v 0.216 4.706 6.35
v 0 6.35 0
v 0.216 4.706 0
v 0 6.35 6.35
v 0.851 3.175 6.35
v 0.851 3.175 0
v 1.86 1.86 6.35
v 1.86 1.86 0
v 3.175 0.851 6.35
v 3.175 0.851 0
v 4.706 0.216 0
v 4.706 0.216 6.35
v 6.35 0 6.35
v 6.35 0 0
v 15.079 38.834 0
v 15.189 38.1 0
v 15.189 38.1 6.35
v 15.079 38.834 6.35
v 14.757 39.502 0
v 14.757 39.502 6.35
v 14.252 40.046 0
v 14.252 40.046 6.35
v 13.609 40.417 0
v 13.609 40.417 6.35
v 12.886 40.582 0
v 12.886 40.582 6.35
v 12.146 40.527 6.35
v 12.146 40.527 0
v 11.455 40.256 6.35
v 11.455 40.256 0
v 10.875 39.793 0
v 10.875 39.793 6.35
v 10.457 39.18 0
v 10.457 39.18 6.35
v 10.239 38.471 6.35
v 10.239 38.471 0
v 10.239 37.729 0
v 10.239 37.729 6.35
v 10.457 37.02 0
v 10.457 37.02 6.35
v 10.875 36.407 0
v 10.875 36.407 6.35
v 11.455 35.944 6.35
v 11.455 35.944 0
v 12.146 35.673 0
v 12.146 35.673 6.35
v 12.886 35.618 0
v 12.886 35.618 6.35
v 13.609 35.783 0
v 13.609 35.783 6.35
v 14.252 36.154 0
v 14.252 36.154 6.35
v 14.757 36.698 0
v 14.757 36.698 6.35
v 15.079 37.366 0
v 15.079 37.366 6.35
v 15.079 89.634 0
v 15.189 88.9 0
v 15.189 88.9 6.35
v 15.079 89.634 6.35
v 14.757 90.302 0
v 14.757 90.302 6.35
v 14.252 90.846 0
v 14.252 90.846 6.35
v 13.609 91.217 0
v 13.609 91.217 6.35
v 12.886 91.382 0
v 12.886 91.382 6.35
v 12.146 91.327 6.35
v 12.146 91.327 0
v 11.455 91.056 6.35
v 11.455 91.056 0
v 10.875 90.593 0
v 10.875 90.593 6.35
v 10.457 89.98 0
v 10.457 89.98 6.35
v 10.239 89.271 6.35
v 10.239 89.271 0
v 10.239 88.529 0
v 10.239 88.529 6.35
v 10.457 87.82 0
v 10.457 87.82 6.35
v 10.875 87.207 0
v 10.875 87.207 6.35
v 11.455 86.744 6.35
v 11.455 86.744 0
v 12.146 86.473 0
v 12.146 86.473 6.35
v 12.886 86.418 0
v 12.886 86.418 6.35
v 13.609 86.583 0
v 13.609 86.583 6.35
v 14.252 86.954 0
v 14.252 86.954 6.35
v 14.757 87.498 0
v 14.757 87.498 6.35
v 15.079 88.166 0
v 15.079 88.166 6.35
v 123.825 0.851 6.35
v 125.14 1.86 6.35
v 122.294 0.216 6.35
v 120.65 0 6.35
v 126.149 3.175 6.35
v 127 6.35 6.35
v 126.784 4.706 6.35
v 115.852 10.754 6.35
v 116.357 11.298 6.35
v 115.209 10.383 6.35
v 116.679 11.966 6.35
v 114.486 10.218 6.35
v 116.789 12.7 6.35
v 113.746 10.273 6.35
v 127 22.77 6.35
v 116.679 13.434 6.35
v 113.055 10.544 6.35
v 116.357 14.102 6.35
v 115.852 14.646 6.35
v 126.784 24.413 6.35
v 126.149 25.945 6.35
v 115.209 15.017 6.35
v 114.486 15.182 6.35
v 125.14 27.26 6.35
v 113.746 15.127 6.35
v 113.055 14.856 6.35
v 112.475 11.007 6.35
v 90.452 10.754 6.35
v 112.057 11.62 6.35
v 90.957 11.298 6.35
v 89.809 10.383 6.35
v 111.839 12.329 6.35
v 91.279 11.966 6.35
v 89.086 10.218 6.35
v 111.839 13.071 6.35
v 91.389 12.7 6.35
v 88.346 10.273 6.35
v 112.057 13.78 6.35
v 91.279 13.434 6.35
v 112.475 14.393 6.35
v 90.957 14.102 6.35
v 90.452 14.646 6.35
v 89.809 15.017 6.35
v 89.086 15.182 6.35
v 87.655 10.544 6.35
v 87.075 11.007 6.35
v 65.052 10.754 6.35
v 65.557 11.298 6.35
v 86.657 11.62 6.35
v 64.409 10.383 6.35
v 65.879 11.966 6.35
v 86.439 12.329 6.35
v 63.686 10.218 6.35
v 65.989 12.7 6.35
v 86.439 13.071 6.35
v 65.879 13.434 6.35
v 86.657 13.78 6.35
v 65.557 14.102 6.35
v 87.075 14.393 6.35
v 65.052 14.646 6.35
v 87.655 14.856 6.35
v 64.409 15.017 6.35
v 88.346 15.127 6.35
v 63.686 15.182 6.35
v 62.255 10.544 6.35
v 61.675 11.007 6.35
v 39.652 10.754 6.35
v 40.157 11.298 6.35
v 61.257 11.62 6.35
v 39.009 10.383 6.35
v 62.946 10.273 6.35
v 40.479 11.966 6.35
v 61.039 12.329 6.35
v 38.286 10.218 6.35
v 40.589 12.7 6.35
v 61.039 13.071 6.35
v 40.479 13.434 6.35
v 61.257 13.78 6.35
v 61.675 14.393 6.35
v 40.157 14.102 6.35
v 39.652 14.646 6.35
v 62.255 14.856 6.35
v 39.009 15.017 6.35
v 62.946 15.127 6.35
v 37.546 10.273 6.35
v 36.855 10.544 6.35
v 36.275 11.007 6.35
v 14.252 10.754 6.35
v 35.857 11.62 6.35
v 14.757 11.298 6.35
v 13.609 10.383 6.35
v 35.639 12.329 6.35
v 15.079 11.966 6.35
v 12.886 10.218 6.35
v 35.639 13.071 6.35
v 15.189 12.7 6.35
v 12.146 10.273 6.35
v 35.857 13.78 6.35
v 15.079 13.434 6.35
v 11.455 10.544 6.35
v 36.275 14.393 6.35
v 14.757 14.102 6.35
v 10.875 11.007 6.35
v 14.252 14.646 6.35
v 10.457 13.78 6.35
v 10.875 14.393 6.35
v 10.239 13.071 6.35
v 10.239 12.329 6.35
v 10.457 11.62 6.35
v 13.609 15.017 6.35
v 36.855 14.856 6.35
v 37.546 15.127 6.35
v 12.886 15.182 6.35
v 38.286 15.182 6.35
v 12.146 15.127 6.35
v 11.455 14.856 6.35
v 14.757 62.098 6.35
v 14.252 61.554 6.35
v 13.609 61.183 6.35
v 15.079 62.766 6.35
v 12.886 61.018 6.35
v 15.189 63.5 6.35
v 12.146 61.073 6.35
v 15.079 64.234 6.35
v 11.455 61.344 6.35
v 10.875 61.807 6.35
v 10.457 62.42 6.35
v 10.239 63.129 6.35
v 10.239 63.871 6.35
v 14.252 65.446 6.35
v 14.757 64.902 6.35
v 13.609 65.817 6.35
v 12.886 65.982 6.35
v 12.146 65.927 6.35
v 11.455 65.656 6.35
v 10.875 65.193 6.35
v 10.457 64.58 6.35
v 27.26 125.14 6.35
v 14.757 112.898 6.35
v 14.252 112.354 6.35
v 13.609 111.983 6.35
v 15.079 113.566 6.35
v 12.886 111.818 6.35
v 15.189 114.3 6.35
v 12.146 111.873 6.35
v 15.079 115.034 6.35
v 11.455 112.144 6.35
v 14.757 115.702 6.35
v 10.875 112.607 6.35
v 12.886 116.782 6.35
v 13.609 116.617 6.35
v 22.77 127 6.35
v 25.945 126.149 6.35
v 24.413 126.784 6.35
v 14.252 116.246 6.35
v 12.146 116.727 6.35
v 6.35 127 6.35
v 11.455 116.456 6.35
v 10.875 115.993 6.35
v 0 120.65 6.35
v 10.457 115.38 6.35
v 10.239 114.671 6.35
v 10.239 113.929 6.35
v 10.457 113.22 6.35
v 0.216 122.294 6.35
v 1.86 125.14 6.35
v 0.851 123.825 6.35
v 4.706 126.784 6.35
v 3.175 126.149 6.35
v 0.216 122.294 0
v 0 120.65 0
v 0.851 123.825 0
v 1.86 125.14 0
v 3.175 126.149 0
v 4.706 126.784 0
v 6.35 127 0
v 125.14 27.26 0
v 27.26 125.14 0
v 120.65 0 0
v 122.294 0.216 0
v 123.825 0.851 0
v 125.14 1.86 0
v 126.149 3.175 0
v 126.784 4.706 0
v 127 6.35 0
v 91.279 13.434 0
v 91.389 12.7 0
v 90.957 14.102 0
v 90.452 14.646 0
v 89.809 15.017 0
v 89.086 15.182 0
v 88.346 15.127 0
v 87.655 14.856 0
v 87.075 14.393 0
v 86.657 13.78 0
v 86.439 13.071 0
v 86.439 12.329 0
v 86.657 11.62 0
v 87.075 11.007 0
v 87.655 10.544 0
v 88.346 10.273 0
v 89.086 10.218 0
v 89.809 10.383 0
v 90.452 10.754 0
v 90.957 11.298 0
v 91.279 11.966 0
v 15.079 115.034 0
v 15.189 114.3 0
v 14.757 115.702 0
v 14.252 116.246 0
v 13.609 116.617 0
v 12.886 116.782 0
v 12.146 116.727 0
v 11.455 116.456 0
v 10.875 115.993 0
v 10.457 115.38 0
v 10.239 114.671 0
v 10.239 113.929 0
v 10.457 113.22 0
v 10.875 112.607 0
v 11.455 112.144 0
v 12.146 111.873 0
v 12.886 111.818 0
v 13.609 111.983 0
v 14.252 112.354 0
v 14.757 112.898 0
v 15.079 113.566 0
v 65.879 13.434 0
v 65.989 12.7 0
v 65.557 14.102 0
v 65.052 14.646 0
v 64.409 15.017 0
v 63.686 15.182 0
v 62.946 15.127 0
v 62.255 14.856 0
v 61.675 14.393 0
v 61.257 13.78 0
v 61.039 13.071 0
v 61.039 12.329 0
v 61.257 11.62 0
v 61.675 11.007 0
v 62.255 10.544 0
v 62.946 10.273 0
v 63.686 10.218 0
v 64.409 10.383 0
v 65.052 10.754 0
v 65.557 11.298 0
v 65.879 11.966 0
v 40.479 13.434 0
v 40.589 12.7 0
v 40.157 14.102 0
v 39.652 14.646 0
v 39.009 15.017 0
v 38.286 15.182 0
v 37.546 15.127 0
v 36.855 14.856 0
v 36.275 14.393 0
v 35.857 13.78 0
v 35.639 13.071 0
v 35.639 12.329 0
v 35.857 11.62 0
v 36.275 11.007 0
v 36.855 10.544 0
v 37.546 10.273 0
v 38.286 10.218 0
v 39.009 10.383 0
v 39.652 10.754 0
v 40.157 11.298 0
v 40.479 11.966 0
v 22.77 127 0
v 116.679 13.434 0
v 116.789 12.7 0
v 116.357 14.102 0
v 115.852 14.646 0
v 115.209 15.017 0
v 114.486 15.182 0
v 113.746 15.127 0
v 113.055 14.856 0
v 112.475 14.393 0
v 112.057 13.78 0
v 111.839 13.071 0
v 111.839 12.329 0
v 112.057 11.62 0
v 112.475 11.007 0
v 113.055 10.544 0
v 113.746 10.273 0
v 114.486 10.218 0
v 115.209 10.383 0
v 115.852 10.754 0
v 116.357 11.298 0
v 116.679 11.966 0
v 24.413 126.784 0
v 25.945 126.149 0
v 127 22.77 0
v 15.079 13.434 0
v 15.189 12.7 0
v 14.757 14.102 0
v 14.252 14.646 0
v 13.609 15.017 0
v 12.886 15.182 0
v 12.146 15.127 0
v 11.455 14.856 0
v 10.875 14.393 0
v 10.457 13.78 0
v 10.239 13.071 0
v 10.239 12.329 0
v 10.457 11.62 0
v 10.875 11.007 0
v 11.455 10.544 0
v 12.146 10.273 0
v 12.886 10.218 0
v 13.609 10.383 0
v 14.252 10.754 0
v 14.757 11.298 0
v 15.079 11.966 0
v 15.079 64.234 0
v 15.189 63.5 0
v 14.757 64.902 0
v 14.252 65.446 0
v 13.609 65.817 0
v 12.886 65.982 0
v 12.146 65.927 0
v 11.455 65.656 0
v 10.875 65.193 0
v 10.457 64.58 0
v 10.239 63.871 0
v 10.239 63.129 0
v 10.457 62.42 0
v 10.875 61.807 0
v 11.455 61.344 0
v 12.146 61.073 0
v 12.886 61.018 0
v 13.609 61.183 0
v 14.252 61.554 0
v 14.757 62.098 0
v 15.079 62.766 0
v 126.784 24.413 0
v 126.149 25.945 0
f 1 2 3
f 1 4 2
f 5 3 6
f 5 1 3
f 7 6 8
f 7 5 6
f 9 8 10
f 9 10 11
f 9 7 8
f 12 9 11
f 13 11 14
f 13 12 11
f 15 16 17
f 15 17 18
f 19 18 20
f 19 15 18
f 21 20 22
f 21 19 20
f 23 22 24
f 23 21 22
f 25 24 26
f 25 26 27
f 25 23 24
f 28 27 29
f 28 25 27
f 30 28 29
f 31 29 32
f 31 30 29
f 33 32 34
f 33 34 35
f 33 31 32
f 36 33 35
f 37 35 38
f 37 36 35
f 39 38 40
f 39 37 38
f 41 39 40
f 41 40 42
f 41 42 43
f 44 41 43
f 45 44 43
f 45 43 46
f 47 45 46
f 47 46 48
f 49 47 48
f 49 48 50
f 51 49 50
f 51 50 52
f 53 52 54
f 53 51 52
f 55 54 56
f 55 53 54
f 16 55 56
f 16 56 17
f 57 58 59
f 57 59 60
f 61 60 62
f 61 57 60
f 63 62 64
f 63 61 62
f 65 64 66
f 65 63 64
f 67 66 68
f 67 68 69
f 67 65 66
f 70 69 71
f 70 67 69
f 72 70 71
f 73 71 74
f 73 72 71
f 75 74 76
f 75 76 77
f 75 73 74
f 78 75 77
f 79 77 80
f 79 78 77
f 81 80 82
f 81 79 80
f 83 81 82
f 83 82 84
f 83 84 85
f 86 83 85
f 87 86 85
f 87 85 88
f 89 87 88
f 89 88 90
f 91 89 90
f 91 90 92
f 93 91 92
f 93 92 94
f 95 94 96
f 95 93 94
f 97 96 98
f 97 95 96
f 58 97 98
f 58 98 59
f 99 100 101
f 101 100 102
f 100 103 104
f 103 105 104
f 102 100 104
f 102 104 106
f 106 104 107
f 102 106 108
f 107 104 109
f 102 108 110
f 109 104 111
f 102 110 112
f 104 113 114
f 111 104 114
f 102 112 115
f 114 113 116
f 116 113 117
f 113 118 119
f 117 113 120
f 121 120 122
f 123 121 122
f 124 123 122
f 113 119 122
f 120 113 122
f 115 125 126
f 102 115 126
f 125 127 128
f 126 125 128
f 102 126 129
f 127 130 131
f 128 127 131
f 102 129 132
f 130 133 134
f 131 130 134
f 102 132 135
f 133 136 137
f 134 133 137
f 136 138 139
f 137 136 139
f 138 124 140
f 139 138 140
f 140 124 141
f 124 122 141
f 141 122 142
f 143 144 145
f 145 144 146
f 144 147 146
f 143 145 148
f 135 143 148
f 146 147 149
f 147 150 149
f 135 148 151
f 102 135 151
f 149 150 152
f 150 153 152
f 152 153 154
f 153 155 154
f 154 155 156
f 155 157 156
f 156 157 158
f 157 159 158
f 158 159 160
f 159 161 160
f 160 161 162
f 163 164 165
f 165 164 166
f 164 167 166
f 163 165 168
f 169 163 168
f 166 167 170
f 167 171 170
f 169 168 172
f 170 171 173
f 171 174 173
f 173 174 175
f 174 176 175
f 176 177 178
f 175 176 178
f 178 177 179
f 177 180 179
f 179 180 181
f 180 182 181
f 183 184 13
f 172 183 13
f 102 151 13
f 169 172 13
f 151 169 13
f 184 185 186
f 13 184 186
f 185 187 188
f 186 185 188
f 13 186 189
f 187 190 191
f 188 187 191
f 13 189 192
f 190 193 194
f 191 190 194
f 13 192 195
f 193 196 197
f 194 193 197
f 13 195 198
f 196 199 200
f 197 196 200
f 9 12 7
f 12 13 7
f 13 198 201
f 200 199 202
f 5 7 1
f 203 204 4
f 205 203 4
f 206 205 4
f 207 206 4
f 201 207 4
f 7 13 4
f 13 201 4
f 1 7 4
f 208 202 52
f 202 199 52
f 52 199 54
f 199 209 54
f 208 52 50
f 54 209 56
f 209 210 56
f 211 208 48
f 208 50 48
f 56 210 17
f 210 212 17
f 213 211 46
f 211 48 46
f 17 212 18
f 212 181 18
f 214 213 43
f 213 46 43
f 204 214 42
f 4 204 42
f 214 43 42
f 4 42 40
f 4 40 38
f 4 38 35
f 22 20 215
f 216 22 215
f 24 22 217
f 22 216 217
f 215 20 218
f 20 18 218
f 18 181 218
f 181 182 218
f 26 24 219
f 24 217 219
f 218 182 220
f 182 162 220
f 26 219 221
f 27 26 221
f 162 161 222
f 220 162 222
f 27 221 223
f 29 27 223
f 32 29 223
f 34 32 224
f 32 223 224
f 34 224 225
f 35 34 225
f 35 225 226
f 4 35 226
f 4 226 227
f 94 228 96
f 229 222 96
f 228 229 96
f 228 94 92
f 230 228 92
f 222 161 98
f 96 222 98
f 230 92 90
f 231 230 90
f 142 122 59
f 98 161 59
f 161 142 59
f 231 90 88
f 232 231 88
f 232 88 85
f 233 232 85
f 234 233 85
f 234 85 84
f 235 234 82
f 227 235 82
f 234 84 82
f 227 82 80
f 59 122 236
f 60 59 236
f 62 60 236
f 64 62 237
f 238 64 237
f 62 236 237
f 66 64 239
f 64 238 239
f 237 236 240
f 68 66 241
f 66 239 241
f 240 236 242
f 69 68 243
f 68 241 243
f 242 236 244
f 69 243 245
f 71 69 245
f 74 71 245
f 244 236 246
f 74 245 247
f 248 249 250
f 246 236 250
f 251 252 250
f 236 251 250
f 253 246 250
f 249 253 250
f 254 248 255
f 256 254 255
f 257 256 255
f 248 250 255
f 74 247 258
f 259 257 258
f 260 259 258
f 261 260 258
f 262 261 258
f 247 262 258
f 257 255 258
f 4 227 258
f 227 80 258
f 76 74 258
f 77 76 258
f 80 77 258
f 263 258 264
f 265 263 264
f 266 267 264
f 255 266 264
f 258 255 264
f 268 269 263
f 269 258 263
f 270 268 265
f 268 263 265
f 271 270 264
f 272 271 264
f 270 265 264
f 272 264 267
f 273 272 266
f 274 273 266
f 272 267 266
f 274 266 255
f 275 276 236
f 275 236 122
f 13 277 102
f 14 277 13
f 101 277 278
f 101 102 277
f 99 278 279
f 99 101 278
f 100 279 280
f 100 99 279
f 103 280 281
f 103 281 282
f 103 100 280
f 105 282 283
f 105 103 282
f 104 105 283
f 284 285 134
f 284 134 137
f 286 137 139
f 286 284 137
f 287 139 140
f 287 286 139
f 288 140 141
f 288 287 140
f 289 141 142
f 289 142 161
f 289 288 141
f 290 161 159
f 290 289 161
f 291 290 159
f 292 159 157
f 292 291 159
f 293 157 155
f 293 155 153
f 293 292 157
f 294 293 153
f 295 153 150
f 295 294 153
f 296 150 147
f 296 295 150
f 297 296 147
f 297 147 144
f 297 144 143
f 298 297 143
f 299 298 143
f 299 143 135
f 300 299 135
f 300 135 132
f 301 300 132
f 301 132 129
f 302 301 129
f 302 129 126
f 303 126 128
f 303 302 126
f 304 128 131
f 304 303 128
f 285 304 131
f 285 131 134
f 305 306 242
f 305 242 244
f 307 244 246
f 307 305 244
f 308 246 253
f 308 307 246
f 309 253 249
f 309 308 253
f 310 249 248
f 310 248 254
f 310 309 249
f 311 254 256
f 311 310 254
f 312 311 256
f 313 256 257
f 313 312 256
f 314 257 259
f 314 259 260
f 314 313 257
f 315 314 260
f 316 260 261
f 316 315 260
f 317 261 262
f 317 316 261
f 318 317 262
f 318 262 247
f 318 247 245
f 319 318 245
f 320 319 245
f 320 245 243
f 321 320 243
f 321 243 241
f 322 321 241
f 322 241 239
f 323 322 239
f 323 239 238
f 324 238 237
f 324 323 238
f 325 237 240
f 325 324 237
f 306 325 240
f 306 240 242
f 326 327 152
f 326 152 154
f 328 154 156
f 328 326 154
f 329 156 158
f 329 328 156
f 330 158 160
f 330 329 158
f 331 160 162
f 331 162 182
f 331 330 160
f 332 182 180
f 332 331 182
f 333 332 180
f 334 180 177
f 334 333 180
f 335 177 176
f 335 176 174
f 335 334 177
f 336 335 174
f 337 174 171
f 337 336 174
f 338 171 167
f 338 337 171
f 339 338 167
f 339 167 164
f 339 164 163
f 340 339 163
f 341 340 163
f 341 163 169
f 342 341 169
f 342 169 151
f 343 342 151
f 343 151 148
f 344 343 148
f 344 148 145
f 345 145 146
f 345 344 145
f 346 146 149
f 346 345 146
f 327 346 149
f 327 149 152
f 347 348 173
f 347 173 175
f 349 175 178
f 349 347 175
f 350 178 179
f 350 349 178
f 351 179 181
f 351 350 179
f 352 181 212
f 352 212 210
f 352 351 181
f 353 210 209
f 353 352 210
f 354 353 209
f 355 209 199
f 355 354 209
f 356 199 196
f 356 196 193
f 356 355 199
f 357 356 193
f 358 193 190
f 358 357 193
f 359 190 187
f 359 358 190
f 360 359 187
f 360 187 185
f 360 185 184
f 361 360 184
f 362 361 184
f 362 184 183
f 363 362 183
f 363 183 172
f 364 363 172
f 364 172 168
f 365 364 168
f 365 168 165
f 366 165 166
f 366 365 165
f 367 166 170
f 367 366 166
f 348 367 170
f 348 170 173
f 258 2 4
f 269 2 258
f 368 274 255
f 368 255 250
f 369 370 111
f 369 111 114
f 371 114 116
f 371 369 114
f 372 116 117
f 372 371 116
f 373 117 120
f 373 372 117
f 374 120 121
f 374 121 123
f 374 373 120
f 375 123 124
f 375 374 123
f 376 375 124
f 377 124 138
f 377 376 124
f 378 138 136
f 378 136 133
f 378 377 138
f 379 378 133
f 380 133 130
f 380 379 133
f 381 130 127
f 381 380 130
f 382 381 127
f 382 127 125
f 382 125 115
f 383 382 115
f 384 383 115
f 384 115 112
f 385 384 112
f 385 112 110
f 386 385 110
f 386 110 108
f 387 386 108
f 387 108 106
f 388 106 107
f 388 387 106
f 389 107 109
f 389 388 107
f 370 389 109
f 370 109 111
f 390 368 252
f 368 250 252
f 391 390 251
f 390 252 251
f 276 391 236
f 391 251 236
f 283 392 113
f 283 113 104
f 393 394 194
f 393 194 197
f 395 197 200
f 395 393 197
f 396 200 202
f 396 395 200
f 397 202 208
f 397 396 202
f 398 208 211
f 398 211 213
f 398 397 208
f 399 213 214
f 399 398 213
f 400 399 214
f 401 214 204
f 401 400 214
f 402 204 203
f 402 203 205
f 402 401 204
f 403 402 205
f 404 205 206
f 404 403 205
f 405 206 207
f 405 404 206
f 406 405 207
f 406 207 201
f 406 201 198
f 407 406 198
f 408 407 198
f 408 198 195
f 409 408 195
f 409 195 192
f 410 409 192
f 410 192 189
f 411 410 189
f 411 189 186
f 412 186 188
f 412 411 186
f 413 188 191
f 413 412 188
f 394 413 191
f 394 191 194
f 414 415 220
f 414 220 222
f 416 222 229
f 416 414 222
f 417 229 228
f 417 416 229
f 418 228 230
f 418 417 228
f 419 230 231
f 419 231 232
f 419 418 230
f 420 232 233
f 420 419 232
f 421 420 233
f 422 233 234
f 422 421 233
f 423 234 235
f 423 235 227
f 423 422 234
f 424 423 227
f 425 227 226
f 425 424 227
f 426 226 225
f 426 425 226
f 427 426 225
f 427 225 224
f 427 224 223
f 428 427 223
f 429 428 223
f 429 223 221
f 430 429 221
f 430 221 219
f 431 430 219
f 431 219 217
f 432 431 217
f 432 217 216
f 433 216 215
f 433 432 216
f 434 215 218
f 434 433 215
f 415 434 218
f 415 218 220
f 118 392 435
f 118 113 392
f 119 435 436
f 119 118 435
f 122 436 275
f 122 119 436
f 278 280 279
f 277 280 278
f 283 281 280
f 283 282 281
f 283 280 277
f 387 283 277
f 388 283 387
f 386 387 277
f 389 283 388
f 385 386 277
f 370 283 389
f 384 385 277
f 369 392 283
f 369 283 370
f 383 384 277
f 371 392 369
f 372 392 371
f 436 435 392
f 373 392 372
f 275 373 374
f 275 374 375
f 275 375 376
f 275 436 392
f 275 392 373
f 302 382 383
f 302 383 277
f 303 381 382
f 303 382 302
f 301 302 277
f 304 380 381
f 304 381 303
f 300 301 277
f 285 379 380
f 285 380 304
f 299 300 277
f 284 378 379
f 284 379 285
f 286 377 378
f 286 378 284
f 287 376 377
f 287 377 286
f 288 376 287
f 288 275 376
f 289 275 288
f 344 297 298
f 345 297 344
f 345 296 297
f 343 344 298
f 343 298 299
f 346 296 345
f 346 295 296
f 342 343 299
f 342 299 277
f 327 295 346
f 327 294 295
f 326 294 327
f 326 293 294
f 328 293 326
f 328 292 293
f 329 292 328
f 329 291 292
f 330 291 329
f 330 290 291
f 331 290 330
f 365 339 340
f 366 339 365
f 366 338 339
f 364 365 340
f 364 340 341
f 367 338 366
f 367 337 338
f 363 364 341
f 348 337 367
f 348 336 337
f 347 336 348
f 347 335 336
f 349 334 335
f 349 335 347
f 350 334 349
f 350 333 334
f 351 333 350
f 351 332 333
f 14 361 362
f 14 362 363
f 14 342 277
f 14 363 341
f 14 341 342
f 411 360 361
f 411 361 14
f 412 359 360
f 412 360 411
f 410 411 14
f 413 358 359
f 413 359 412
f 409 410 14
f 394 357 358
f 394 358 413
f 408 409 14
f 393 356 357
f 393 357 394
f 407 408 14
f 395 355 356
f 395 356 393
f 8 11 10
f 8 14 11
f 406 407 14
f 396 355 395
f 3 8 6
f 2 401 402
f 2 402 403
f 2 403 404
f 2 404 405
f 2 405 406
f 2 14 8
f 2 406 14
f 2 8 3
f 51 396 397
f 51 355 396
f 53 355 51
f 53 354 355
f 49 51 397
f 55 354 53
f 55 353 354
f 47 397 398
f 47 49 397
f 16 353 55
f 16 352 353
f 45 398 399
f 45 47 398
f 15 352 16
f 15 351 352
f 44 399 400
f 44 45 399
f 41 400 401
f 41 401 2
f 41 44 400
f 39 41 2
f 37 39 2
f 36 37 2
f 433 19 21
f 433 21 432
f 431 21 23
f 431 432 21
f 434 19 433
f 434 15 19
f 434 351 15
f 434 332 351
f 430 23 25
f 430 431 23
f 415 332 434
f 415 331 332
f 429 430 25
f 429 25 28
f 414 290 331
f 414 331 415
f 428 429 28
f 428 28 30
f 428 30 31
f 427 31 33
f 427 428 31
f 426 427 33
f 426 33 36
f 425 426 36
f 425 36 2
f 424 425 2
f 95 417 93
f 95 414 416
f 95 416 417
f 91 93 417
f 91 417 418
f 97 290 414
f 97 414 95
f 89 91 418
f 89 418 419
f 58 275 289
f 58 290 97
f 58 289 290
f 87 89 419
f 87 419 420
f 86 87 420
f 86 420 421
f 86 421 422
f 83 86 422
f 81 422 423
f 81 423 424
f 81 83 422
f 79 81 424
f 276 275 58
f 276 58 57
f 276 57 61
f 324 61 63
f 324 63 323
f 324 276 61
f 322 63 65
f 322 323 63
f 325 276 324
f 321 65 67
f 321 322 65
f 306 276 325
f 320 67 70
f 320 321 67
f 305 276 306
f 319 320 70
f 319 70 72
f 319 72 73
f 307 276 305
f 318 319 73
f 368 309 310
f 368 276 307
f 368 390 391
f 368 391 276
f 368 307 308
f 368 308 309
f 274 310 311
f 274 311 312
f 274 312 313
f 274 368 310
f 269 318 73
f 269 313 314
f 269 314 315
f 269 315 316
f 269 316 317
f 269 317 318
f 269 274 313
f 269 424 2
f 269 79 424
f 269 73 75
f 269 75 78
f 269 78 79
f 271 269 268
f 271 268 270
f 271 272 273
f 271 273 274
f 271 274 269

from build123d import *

# Parameters (mm, degrees)
SKETCH1_R           = 2.4892
BOSS_EXTRUDE1_DEPTH = 6.35
FILLET1_R           = 6.35


with BuildPart() as part:
    # Sketch1 → Boss-Extrude1 (new body)
    with BuildSketch(Plane.XY):
        Polygon((0, 0), (0, 127), (25.4, 127), (127, 25.4), (127, 0), align=None)
        with Locations((12.7, 12.7)):
            Circle(SKETCH1_R, mode=Mode.SUBTRACT)
        with Locations((38.1, 12.7)):
            Circle(SKETCH1_R, mode=Mode.SUBTRACT)
        with Locations((63.5, 12.7)):
            Circle(SKETCH1_R, mode=Mode.SUBTRACT)
        with Locations((12.7, 38.1)):
            Circle(SKETCH1_R, mode=Mode.SUBTRACT)
        with Locations((12.7, 63.5)):
            Circle(SKETCH1_R, mode=Mode.SUBTRACT)
        with Locations((12.7, 88.9)):
            Circle(SKETCH1_R, mode=Mode.SUBTRACT)
        with Locations((12.7, 114.3)):
            Circle(SKETCH1_R, mode=Mode.SUBTRACT)
        with Locations((88.9, 12.7)):
            Circle(SKETCH1_R, mode=Mode.SUBTRACT)
        with Locations((114.3, 12.7)):
            Circle(SKETCH1_R, mode=Mode.SUBTRACT)
    extrude(amount=BOSS_EXTRUDE1_DEPTH)

    # Fillet1
    fillet1_edges = [part.edges().sort_by_distance(p)[0] for p in [
        (127, 0, 3.175),
        (0, 0, 3.175),
        (0, 127, 3.175),
        (25.4, 127, 3.175),
        (127, 25.4, 3.175),
    ]]
    fillet(fillet1_edges, radius=FILLET1_R)


solid = part.part
